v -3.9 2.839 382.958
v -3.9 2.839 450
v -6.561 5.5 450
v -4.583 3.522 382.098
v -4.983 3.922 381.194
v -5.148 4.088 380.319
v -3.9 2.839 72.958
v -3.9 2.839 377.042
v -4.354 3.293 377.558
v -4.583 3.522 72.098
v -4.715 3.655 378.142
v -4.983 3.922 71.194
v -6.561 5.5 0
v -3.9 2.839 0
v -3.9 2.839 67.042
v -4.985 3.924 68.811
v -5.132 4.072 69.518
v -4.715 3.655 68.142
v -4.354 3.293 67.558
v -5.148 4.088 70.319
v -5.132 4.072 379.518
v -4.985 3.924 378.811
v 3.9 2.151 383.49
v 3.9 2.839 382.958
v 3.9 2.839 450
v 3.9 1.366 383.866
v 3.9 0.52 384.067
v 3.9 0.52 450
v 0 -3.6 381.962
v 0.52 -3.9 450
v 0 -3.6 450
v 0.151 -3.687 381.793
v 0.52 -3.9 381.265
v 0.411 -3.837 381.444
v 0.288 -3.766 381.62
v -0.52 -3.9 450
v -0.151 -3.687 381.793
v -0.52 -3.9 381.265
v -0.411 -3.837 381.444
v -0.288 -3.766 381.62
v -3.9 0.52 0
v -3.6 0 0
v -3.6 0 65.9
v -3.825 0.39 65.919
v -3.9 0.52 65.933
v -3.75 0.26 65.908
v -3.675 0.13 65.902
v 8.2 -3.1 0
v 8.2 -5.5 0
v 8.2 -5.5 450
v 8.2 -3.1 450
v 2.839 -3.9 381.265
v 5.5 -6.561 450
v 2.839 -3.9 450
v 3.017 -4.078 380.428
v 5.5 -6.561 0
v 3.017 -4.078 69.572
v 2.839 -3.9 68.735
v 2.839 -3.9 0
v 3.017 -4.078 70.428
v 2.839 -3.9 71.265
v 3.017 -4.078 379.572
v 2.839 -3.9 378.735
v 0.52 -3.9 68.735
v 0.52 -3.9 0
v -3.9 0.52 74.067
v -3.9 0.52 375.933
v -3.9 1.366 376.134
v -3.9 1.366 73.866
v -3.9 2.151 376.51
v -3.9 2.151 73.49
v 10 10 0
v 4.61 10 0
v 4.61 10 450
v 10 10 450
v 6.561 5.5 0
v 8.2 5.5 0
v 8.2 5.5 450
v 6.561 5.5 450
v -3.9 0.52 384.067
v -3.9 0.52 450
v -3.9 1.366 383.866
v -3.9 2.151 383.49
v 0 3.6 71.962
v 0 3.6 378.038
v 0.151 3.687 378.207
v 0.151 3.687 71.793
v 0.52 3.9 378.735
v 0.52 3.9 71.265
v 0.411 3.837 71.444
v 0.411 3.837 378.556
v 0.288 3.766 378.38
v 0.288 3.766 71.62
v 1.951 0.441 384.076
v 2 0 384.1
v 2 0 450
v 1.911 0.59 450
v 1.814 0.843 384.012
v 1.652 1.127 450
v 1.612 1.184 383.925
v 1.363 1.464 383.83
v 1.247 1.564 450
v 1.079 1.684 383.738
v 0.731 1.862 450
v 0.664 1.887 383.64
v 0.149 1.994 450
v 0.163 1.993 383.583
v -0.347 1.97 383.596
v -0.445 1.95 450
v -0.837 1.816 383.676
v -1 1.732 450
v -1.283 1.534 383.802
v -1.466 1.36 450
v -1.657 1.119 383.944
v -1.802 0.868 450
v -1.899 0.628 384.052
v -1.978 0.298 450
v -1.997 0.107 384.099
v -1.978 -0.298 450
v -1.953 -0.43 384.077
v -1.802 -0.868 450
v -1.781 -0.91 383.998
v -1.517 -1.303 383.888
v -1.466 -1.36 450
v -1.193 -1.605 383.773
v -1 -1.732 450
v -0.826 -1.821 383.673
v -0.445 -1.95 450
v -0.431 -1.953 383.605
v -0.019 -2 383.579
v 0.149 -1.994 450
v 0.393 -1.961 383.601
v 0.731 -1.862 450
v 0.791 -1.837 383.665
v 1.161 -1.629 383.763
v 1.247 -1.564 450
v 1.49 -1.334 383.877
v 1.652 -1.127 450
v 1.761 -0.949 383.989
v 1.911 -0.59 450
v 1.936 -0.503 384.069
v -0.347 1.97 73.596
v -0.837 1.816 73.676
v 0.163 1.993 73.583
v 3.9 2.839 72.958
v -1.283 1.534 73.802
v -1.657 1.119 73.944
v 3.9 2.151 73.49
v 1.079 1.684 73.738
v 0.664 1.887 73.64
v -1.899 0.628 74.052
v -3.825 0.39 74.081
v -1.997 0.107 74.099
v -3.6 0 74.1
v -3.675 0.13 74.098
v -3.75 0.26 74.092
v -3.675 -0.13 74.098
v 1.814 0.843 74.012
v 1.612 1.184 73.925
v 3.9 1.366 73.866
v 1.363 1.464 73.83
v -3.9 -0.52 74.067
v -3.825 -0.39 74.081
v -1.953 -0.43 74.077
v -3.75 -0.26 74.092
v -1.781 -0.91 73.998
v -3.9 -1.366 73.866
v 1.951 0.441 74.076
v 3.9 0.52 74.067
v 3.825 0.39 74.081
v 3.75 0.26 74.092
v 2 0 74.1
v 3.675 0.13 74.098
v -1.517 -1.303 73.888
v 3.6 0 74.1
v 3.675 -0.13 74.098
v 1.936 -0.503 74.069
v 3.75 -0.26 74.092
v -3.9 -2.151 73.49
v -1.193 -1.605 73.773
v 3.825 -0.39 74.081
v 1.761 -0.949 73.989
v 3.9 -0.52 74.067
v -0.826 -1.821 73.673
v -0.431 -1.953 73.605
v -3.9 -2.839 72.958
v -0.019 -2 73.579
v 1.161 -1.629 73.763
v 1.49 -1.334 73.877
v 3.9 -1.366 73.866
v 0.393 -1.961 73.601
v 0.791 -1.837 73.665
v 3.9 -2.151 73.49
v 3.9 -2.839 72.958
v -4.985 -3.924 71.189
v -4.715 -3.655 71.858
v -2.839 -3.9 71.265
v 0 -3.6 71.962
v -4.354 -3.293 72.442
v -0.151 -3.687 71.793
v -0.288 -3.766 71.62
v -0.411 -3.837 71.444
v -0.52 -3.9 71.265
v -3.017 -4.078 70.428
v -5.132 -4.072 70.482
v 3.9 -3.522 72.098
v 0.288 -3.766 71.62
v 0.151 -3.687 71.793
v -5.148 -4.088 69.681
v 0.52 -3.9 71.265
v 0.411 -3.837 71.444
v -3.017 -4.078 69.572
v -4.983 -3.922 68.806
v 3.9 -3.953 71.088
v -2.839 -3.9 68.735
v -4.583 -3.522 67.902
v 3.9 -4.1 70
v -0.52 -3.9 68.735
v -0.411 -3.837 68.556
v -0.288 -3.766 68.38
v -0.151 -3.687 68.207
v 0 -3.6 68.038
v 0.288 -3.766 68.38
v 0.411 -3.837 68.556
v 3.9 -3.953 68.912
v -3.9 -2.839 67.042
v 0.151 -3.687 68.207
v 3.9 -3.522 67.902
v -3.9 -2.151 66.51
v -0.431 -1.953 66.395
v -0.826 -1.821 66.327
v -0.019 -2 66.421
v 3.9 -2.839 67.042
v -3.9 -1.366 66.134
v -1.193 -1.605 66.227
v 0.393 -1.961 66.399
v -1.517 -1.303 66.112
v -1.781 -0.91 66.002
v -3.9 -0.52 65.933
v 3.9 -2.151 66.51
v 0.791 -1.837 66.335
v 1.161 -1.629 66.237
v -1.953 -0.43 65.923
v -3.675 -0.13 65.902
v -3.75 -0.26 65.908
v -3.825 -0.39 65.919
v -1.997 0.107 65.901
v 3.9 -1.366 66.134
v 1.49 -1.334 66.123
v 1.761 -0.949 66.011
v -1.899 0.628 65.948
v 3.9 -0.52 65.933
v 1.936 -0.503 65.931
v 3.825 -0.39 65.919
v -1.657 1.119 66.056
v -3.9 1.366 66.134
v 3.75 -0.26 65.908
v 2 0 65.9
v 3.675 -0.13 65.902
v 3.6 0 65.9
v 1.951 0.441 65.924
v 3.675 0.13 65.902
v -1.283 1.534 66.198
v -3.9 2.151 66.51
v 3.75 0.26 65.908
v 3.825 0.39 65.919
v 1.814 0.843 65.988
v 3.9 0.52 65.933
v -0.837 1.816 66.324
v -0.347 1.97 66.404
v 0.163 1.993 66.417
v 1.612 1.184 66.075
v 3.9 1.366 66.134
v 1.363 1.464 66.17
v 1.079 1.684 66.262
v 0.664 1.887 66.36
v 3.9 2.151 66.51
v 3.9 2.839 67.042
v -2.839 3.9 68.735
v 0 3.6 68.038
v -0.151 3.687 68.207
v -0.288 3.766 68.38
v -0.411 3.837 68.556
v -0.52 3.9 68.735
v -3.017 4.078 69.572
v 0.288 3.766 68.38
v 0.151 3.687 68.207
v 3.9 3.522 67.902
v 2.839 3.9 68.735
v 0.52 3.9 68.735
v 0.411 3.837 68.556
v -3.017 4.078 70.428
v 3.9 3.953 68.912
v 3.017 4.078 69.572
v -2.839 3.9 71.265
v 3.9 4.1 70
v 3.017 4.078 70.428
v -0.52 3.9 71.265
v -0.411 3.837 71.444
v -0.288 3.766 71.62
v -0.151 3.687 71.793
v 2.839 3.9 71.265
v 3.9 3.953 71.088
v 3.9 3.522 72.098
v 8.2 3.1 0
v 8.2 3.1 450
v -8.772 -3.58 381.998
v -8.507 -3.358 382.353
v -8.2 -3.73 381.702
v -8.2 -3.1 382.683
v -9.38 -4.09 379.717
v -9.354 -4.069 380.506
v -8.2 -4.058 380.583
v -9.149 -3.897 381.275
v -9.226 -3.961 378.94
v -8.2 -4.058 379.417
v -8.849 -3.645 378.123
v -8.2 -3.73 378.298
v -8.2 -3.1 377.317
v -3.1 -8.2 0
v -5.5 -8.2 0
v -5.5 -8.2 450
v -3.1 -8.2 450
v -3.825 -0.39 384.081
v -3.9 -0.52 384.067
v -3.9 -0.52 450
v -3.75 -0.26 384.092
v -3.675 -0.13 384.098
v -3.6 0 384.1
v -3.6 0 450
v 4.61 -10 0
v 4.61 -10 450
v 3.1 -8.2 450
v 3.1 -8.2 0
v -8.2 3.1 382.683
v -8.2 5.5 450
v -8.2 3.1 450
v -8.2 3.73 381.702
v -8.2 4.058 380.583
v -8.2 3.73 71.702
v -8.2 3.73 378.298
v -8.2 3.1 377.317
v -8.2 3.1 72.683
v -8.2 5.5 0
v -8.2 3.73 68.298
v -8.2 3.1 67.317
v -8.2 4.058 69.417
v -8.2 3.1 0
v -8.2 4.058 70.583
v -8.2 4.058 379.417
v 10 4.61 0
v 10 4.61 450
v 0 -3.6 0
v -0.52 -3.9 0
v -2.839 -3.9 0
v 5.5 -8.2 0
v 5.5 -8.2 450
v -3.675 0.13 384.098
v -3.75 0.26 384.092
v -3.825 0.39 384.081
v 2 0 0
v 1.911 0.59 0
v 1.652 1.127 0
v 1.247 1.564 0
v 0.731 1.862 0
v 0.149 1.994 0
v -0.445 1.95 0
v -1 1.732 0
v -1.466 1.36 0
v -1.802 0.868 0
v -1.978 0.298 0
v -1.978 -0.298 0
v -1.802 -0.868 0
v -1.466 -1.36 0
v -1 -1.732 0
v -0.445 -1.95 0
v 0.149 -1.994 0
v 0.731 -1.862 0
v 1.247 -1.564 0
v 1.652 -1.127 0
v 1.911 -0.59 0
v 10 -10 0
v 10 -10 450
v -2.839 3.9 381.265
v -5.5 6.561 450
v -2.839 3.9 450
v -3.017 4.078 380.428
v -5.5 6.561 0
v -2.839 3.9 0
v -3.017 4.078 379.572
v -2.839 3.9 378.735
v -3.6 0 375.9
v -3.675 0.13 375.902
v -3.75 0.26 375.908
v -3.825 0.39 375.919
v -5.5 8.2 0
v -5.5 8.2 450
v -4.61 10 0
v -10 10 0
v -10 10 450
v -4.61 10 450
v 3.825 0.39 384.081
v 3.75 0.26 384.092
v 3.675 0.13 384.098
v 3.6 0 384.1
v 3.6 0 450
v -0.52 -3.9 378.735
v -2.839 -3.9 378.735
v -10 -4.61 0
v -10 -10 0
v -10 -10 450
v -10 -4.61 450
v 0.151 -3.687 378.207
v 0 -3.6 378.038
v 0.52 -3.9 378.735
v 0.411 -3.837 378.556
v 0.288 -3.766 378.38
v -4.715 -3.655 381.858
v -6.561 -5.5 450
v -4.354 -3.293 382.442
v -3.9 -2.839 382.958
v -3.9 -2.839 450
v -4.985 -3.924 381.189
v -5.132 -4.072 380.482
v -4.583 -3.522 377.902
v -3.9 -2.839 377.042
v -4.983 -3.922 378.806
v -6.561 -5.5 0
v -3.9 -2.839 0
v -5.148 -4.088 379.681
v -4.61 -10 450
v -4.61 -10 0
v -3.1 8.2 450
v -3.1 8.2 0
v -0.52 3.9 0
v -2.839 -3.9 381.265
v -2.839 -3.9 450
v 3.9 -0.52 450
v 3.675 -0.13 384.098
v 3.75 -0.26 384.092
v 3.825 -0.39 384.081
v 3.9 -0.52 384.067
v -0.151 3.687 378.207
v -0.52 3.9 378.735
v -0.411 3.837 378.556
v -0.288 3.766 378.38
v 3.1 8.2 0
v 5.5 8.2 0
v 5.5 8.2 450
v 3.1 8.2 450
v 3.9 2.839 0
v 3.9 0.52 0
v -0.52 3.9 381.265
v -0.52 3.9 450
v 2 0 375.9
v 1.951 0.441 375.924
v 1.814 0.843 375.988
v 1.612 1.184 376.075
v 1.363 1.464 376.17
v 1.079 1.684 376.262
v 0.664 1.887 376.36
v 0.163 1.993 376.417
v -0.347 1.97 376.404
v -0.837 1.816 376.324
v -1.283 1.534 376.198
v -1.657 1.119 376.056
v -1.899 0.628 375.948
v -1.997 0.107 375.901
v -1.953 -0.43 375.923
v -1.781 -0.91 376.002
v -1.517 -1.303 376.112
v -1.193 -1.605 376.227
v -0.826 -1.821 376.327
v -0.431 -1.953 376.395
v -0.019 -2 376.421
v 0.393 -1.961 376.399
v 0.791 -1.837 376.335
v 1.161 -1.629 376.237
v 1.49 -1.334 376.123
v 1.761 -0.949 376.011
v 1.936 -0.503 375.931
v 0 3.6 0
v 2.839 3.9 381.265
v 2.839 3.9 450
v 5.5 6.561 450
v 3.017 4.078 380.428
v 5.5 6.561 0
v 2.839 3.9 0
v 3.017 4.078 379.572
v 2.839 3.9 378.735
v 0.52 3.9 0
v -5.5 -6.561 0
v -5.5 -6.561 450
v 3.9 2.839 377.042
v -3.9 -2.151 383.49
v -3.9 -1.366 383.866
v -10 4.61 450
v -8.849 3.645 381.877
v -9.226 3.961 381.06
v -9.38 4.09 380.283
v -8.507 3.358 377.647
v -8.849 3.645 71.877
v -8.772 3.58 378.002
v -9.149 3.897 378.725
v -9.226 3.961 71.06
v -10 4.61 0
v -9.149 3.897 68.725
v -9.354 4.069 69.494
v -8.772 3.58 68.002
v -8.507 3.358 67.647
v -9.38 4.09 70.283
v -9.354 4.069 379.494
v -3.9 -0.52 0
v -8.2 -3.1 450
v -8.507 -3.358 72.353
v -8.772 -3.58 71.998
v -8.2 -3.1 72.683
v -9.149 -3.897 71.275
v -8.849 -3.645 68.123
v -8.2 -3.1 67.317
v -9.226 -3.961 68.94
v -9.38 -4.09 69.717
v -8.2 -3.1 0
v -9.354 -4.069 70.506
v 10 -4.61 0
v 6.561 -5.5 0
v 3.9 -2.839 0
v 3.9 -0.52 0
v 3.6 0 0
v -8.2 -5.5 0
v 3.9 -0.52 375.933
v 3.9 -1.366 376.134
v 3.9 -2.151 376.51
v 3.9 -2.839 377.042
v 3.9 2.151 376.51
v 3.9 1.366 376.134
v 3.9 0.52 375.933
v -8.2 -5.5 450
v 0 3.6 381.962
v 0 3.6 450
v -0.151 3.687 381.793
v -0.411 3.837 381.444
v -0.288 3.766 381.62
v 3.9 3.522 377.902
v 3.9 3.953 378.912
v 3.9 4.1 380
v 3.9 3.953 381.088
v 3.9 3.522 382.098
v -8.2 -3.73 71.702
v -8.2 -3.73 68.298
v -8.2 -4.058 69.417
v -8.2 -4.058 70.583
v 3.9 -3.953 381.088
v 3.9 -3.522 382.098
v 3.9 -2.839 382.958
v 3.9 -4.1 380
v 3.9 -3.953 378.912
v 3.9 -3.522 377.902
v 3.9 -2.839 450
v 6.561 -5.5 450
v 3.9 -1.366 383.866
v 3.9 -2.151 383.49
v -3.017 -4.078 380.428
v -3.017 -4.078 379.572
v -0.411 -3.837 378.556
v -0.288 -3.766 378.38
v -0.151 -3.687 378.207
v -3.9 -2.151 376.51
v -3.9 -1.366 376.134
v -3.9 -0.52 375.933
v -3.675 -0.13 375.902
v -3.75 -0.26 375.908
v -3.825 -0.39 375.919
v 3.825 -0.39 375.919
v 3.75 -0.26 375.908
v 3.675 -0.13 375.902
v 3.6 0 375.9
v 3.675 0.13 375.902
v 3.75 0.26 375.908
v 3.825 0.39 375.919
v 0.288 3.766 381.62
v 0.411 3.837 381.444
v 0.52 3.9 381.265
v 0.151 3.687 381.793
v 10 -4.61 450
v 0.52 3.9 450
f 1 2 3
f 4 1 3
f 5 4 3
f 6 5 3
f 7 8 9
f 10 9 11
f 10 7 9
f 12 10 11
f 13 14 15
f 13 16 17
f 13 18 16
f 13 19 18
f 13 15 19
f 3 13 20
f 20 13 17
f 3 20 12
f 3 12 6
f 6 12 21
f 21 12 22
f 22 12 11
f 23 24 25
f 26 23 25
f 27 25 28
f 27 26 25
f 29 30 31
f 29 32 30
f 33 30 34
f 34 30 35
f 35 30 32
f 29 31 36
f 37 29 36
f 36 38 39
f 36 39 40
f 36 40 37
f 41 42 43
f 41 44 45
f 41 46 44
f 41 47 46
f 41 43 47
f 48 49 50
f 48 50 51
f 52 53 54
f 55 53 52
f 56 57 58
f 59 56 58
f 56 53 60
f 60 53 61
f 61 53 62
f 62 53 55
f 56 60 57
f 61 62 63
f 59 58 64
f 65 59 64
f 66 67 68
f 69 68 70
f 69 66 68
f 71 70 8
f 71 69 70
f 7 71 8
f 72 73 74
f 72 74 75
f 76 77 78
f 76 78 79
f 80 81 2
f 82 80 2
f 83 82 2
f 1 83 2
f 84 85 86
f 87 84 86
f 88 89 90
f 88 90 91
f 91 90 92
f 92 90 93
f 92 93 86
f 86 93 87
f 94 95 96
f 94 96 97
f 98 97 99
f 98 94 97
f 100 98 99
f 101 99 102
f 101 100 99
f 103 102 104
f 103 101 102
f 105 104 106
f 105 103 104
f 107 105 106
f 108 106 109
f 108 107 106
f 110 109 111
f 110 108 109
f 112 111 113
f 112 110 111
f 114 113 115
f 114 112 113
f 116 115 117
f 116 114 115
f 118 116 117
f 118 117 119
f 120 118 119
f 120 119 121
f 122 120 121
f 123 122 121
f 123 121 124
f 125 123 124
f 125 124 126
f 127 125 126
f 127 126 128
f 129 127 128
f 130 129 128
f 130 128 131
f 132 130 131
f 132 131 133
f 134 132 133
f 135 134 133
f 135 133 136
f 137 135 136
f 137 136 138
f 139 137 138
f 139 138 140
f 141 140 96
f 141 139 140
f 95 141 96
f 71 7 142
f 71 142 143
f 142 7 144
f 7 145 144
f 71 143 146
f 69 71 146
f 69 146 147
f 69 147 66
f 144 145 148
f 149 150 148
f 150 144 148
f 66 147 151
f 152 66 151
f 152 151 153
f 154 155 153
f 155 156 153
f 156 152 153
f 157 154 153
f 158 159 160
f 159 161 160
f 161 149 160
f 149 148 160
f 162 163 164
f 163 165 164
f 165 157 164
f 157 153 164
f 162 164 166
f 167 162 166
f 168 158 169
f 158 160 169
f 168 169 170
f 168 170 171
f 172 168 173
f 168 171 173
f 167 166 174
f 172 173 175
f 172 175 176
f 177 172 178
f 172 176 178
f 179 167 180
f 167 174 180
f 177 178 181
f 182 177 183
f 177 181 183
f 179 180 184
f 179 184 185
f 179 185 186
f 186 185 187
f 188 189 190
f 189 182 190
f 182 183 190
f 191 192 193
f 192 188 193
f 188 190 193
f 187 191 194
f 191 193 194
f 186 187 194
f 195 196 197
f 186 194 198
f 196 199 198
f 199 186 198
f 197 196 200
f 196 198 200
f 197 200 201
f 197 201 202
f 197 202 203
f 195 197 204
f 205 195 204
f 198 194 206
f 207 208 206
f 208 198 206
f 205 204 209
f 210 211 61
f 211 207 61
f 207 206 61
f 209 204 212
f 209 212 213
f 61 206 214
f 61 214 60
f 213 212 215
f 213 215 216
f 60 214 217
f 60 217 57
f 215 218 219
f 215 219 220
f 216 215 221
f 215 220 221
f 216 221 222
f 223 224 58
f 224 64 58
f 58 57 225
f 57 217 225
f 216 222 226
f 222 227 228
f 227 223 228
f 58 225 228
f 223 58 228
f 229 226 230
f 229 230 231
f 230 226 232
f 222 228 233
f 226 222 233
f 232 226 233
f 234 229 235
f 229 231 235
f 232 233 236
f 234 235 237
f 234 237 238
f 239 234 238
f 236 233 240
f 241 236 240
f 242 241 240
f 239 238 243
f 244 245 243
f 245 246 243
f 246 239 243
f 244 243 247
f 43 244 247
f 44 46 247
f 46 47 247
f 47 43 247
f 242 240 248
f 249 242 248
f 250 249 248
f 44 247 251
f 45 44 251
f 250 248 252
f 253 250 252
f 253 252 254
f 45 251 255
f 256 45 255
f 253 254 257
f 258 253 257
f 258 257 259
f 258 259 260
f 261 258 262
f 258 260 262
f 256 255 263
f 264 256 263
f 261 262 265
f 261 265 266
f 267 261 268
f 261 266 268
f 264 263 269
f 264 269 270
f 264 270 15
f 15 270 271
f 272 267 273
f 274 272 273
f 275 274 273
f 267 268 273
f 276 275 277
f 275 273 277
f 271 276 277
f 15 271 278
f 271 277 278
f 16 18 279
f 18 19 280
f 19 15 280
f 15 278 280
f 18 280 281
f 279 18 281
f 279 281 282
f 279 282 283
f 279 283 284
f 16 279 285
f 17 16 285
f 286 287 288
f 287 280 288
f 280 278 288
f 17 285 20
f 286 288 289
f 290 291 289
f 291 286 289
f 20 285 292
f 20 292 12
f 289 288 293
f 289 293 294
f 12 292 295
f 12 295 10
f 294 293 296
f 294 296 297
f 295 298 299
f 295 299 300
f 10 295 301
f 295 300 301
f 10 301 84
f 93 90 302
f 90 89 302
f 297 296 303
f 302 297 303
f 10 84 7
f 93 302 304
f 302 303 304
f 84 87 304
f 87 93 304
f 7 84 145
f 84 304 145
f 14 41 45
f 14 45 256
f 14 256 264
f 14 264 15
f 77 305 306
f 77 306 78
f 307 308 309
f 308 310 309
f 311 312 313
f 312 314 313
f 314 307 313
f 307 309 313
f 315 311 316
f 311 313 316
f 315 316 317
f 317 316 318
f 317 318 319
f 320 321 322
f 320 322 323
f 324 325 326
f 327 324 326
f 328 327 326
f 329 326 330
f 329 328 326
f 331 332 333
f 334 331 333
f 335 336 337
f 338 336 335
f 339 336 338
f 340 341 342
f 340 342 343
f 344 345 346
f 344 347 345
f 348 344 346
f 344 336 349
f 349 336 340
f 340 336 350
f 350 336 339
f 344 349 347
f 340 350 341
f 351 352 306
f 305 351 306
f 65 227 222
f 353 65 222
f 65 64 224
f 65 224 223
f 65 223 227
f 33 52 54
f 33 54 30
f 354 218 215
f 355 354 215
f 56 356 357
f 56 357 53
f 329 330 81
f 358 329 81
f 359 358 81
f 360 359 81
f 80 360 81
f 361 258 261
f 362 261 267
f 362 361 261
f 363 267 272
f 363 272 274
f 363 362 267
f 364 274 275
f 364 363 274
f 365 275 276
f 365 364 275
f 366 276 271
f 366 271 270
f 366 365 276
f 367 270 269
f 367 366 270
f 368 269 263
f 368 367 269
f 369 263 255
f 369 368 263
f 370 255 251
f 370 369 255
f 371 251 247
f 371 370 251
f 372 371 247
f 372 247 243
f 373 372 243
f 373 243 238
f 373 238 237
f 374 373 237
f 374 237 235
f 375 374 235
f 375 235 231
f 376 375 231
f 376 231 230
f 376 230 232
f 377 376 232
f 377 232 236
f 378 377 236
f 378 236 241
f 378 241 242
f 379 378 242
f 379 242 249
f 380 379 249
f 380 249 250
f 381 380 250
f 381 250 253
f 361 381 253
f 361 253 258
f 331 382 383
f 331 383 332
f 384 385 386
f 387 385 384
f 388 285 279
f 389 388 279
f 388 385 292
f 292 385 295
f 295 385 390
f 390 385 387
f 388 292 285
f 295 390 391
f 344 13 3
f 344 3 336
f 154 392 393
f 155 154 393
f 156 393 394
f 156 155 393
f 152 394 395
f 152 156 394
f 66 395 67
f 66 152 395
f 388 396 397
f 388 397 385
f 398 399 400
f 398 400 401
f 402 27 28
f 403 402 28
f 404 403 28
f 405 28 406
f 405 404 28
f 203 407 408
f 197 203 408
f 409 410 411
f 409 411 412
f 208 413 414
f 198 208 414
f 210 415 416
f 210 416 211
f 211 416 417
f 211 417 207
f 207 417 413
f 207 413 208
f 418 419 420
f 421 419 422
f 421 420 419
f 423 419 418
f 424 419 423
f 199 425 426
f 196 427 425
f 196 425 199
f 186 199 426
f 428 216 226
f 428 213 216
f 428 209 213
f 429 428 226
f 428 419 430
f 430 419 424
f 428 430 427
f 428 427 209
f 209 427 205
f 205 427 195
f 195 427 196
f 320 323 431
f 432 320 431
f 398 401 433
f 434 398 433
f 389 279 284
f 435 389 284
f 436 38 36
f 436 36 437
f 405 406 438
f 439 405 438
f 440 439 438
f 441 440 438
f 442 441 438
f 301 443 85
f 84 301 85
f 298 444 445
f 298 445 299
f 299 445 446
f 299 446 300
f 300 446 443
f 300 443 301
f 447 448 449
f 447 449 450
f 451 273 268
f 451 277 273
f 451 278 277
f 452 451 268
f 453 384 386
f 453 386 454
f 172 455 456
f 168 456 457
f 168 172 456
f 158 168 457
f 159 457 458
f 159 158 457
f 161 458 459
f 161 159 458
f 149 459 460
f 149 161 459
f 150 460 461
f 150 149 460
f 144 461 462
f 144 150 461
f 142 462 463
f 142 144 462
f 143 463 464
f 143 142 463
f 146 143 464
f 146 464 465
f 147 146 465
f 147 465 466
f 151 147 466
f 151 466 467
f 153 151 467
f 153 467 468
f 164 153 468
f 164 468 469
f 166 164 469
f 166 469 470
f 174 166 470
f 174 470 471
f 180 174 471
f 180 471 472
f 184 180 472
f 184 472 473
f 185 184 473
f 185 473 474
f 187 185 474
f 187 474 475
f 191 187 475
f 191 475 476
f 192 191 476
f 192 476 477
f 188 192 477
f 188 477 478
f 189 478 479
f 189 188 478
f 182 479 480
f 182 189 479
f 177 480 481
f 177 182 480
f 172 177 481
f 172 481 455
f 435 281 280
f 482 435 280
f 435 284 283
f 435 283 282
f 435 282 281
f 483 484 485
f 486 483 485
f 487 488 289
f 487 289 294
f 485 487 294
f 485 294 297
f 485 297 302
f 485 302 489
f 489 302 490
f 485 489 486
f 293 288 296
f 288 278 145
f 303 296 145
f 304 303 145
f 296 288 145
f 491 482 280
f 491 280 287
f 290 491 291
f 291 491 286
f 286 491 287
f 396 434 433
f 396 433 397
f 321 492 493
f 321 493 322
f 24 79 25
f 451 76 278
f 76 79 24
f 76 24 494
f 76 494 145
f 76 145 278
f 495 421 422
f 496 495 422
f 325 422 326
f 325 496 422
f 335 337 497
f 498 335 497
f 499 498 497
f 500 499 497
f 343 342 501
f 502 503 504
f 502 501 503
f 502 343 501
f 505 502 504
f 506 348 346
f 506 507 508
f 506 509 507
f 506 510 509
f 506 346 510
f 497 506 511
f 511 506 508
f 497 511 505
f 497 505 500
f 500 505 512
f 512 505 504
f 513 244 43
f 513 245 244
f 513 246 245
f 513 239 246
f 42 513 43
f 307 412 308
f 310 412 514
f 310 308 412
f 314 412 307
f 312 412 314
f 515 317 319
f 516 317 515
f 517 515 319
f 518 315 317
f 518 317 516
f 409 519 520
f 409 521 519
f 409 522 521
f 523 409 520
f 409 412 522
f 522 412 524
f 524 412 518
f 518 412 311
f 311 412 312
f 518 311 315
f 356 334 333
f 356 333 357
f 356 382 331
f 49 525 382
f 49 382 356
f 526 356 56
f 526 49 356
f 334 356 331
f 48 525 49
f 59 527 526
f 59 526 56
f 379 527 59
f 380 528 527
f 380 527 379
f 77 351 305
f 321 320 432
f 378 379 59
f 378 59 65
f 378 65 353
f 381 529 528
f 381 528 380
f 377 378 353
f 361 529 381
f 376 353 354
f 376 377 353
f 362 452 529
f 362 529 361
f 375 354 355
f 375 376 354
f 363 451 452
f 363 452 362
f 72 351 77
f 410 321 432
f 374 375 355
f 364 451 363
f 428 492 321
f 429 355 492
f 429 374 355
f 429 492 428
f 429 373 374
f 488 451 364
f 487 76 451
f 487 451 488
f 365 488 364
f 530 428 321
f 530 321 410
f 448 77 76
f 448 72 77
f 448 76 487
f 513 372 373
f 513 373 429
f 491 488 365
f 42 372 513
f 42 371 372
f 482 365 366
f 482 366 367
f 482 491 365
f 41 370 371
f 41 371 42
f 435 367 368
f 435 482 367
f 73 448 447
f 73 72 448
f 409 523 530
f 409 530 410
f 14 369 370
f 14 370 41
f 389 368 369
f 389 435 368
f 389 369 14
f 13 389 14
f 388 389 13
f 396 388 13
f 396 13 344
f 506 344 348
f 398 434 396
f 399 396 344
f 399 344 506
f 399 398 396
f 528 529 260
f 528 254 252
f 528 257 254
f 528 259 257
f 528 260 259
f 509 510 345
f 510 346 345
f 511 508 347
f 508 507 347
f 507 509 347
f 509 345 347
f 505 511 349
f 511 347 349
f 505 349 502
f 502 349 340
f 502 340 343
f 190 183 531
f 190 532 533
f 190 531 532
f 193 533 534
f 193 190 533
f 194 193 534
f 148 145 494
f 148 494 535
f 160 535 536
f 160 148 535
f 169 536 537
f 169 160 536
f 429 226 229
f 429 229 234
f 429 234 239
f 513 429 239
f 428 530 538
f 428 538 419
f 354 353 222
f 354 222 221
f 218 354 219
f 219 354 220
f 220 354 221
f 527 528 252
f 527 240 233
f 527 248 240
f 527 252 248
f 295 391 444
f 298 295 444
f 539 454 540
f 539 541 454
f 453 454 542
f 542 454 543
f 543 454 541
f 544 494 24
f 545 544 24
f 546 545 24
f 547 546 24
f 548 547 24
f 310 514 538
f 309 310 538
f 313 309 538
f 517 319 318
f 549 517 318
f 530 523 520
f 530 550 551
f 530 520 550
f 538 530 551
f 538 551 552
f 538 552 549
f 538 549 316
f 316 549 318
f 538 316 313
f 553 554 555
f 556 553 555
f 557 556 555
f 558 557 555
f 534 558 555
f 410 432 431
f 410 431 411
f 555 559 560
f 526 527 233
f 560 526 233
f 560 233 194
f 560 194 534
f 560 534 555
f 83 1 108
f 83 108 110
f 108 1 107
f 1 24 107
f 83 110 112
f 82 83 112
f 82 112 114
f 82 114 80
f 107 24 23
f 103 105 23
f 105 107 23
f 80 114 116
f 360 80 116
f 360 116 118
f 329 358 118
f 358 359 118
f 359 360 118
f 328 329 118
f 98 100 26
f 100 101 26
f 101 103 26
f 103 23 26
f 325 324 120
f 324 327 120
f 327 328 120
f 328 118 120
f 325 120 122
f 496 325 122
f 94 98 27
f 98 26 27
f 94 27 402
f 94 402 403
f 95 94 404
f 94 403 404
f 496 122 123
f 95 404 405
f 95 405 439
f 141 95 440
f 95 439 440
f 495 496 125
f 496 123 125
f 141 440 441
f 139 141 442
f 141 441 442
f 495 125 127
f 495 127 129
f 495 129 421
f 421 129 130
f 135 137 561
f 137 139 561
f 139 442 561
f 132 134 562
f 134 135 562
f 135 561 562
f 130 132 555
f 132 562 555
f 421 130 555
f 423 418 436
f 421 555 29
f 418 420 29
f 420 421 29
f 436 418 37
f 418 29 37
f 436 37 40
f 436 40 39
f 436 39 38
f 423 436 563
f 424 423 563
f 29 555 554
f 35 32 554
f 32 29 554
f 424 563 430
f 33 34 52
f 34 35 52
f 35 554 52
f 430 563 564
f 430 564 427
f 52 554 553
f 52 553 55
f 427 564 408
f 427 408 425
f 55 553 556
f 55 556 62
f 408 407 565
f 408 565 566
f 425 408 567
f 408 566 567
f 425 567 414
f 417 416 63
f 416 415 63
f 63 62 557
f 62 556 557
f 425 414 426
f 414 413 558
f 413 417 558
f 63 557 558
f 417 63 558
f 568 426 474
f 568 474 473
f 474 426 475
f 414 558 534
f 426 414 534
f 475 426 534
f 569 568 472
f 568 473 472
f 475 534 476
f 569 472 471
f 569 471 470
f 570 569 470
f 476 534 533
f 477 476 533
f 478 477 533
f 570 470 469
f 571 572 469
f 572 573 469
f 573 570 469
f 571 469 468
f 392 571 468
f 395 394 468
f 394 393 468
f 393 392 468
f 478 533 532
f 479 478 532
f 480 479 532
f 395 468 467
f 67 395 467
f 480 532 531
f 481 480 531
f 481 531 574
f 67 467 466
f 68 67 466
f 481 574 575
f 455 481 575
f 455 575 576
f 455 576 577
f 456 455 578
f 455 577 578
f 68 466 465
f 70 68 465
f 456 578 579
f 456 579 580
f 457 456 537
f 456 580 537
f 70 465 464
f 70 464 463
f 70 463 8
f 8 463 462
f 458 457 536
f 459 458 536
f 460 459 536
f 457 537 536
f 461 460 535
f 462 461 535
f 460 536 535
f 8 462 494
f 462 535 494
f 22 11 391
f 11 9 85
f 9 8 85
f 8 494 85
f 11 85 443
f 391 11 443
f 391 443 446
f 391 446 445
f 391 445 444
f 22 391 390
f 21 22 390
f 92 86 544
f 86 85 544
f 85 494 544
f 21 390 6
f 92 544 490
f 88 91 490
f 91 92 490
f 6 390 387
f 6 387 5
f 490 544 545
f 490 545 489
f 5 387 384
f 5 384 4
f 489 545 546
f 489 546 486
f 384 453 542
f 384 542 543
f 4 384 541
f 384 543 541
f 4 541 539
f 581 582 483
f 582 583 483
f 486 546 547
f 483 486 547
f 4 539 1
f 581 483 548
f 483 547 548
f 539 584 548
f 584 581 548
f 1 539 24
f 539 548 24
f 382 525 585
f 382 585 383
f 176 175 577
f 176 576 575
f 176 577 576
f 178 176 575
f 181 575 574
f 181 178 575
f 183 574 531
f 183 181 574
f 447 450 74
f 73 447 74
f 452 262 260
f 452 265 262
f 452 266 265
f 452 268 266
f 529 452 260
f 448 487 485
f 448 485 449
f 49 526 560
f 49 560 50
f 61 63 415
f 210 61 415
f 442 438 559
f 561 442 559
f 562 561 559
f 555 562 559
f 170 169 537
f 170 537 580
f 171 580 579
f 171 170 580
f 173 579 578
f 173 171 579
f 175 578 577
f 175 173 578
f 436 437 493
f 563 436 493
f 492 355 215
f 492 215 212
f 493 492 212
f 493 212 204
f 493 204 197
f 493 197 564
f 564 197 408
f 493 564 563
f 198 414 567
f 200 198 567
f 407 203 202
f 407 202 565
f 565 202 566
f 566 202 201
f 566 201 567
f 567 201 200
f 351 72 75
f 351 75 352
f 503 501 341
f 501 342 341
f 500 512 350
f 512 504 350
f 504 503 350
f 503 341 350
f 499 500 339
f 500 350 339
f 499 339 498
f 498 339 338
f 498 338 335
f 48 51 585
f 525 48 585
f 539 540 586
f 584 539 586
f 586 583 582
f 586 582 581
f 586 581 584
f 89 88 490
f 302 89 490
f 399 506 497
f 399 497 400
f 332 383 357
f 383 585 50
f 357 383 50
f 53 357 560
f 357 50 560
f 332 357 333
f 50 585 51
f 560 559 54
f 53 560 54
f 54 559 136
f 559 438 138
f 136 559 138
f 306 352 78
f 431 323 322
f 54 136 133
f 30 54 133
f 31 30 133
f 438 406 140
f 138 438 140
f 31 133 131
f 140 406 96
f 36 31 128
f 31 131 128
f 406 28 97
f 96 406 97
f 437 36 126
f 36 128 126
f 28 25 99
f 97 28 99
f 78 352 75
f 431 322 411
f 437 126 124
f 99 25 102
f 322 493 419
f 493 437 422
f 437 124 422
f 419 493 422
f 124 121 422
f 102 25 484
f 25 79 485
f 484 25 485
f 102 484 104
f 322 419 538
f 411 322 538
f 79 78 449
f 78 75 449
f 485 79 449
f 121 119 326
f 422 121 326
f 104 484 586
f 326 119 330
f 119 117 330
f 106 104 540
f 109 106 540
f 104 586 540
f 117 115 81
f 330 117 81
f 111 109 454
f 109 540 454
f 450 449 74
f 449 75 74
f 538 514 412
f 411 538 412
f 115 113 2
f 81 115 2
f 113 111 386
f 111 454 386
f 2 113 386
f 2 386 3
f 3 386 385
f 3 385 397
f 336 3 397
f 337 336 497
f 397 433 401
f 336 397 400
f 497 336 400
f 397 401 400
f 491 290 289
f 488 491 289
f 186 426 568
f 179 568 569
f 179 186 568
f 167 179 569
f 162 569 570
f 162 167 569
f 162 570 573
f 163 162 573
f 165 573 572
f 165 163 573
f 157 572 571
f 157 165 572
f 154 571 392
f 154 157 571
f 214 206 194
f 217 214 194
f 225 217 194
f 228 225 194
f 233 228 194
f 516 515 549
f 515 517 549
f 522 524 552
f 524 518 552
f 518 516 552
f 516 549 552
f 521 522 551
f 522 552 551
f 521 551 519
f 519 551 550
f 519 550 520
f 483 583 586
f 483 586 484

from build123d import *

# Parameters (mm, degrees)
SKETCH1_R           = 2
BOSS_EXTRUDE1_DEPTH = 450
SKETCH2_R           = 4.1
CUT_EXTRUDE1_DEPTH  = 451.325671043


with BuildPart() as part:
    # Sketch1 → Boss-Extrude1 (new body)
    with BuildSketch(Plane.XY):
        Polygon((10, 10), (10, 4.610379336), (8.2, 3.1), (8.2, 5.5), (6.560660172, 5.5), (3.9, 2.839339828), (3.9, 0.519615242), (3.6, 0), (3.9, -0.519615242), (3.9, -2.839339828), (6.560660172, -5.5), (8.2, -5.5), (8.2, -3.1), (10, -4.610379336), (10, -10), (4.610379336, -10), (3.1, -8.2), (5.5, -8.2), (5.5, -6.560660172), (2.839339828, -3.9), (0.519615242, -3.9), (0, -3.6), (-0.519615242, -3.9), (-2.839339828, -3.9), (-5.5, -6.560660172), (-5.5, -8.2), (-3.1, -8.2), (-4.610379336, -10), (-10, -10), (-10, -4.610379336), (-8.2, -3.1), (-8.2, -5.5), (-6.560660172, -5.5), (-3.9, -2.839339828), (-3.9, -0.519615242), (-3.6, 0), (-3.9, 0.519615242), (-3.9, 2.839339828), (-6.560660172, 5.5), (-8.2, 5.5), (-8.2, 3.1), (-10, 4.610379336), (-10, 10), (-4.610379336, 10), (-3.1, 8.2), (-5.5, 8.2), (-5.5, 6.560660172), (-2.839339828, 3.9), (-0.519615242, 3.9), (0, 3.6), (0.519615242, 3.9), (2.839339828, 3.9), (5.5, 6.560660172), (5.5, 8.2), (3.1, 8.2), (4.610379336, 10), align=None)
        Circle(SKETCH1_R, mode=Mode.SUBTRACT)
    extrude(amount=BOSS_EXTRUDE1_DEPTH)

    # Sketch2 → Cut-Extrude1 (cut, through all)
    with BuildSketch(Plane(origin=(3.9, 0, 0), x_dir=(0, 0, -1), z_dir=(1, 0, 0))):
        with Locations(Location((-380, 0, 0), (0, 0, 136.169927123))):
            Circle(SKETCH2_R)
        with Locations(Location((-70, 0, 0), (0, 0, 136.169927123))):
            Circle(SKETCH2_R)
    extrude(amount=-CUT_EXTRUDE1_DEPTH, mode=Mode.SUBTRACT)


solid = part.part
